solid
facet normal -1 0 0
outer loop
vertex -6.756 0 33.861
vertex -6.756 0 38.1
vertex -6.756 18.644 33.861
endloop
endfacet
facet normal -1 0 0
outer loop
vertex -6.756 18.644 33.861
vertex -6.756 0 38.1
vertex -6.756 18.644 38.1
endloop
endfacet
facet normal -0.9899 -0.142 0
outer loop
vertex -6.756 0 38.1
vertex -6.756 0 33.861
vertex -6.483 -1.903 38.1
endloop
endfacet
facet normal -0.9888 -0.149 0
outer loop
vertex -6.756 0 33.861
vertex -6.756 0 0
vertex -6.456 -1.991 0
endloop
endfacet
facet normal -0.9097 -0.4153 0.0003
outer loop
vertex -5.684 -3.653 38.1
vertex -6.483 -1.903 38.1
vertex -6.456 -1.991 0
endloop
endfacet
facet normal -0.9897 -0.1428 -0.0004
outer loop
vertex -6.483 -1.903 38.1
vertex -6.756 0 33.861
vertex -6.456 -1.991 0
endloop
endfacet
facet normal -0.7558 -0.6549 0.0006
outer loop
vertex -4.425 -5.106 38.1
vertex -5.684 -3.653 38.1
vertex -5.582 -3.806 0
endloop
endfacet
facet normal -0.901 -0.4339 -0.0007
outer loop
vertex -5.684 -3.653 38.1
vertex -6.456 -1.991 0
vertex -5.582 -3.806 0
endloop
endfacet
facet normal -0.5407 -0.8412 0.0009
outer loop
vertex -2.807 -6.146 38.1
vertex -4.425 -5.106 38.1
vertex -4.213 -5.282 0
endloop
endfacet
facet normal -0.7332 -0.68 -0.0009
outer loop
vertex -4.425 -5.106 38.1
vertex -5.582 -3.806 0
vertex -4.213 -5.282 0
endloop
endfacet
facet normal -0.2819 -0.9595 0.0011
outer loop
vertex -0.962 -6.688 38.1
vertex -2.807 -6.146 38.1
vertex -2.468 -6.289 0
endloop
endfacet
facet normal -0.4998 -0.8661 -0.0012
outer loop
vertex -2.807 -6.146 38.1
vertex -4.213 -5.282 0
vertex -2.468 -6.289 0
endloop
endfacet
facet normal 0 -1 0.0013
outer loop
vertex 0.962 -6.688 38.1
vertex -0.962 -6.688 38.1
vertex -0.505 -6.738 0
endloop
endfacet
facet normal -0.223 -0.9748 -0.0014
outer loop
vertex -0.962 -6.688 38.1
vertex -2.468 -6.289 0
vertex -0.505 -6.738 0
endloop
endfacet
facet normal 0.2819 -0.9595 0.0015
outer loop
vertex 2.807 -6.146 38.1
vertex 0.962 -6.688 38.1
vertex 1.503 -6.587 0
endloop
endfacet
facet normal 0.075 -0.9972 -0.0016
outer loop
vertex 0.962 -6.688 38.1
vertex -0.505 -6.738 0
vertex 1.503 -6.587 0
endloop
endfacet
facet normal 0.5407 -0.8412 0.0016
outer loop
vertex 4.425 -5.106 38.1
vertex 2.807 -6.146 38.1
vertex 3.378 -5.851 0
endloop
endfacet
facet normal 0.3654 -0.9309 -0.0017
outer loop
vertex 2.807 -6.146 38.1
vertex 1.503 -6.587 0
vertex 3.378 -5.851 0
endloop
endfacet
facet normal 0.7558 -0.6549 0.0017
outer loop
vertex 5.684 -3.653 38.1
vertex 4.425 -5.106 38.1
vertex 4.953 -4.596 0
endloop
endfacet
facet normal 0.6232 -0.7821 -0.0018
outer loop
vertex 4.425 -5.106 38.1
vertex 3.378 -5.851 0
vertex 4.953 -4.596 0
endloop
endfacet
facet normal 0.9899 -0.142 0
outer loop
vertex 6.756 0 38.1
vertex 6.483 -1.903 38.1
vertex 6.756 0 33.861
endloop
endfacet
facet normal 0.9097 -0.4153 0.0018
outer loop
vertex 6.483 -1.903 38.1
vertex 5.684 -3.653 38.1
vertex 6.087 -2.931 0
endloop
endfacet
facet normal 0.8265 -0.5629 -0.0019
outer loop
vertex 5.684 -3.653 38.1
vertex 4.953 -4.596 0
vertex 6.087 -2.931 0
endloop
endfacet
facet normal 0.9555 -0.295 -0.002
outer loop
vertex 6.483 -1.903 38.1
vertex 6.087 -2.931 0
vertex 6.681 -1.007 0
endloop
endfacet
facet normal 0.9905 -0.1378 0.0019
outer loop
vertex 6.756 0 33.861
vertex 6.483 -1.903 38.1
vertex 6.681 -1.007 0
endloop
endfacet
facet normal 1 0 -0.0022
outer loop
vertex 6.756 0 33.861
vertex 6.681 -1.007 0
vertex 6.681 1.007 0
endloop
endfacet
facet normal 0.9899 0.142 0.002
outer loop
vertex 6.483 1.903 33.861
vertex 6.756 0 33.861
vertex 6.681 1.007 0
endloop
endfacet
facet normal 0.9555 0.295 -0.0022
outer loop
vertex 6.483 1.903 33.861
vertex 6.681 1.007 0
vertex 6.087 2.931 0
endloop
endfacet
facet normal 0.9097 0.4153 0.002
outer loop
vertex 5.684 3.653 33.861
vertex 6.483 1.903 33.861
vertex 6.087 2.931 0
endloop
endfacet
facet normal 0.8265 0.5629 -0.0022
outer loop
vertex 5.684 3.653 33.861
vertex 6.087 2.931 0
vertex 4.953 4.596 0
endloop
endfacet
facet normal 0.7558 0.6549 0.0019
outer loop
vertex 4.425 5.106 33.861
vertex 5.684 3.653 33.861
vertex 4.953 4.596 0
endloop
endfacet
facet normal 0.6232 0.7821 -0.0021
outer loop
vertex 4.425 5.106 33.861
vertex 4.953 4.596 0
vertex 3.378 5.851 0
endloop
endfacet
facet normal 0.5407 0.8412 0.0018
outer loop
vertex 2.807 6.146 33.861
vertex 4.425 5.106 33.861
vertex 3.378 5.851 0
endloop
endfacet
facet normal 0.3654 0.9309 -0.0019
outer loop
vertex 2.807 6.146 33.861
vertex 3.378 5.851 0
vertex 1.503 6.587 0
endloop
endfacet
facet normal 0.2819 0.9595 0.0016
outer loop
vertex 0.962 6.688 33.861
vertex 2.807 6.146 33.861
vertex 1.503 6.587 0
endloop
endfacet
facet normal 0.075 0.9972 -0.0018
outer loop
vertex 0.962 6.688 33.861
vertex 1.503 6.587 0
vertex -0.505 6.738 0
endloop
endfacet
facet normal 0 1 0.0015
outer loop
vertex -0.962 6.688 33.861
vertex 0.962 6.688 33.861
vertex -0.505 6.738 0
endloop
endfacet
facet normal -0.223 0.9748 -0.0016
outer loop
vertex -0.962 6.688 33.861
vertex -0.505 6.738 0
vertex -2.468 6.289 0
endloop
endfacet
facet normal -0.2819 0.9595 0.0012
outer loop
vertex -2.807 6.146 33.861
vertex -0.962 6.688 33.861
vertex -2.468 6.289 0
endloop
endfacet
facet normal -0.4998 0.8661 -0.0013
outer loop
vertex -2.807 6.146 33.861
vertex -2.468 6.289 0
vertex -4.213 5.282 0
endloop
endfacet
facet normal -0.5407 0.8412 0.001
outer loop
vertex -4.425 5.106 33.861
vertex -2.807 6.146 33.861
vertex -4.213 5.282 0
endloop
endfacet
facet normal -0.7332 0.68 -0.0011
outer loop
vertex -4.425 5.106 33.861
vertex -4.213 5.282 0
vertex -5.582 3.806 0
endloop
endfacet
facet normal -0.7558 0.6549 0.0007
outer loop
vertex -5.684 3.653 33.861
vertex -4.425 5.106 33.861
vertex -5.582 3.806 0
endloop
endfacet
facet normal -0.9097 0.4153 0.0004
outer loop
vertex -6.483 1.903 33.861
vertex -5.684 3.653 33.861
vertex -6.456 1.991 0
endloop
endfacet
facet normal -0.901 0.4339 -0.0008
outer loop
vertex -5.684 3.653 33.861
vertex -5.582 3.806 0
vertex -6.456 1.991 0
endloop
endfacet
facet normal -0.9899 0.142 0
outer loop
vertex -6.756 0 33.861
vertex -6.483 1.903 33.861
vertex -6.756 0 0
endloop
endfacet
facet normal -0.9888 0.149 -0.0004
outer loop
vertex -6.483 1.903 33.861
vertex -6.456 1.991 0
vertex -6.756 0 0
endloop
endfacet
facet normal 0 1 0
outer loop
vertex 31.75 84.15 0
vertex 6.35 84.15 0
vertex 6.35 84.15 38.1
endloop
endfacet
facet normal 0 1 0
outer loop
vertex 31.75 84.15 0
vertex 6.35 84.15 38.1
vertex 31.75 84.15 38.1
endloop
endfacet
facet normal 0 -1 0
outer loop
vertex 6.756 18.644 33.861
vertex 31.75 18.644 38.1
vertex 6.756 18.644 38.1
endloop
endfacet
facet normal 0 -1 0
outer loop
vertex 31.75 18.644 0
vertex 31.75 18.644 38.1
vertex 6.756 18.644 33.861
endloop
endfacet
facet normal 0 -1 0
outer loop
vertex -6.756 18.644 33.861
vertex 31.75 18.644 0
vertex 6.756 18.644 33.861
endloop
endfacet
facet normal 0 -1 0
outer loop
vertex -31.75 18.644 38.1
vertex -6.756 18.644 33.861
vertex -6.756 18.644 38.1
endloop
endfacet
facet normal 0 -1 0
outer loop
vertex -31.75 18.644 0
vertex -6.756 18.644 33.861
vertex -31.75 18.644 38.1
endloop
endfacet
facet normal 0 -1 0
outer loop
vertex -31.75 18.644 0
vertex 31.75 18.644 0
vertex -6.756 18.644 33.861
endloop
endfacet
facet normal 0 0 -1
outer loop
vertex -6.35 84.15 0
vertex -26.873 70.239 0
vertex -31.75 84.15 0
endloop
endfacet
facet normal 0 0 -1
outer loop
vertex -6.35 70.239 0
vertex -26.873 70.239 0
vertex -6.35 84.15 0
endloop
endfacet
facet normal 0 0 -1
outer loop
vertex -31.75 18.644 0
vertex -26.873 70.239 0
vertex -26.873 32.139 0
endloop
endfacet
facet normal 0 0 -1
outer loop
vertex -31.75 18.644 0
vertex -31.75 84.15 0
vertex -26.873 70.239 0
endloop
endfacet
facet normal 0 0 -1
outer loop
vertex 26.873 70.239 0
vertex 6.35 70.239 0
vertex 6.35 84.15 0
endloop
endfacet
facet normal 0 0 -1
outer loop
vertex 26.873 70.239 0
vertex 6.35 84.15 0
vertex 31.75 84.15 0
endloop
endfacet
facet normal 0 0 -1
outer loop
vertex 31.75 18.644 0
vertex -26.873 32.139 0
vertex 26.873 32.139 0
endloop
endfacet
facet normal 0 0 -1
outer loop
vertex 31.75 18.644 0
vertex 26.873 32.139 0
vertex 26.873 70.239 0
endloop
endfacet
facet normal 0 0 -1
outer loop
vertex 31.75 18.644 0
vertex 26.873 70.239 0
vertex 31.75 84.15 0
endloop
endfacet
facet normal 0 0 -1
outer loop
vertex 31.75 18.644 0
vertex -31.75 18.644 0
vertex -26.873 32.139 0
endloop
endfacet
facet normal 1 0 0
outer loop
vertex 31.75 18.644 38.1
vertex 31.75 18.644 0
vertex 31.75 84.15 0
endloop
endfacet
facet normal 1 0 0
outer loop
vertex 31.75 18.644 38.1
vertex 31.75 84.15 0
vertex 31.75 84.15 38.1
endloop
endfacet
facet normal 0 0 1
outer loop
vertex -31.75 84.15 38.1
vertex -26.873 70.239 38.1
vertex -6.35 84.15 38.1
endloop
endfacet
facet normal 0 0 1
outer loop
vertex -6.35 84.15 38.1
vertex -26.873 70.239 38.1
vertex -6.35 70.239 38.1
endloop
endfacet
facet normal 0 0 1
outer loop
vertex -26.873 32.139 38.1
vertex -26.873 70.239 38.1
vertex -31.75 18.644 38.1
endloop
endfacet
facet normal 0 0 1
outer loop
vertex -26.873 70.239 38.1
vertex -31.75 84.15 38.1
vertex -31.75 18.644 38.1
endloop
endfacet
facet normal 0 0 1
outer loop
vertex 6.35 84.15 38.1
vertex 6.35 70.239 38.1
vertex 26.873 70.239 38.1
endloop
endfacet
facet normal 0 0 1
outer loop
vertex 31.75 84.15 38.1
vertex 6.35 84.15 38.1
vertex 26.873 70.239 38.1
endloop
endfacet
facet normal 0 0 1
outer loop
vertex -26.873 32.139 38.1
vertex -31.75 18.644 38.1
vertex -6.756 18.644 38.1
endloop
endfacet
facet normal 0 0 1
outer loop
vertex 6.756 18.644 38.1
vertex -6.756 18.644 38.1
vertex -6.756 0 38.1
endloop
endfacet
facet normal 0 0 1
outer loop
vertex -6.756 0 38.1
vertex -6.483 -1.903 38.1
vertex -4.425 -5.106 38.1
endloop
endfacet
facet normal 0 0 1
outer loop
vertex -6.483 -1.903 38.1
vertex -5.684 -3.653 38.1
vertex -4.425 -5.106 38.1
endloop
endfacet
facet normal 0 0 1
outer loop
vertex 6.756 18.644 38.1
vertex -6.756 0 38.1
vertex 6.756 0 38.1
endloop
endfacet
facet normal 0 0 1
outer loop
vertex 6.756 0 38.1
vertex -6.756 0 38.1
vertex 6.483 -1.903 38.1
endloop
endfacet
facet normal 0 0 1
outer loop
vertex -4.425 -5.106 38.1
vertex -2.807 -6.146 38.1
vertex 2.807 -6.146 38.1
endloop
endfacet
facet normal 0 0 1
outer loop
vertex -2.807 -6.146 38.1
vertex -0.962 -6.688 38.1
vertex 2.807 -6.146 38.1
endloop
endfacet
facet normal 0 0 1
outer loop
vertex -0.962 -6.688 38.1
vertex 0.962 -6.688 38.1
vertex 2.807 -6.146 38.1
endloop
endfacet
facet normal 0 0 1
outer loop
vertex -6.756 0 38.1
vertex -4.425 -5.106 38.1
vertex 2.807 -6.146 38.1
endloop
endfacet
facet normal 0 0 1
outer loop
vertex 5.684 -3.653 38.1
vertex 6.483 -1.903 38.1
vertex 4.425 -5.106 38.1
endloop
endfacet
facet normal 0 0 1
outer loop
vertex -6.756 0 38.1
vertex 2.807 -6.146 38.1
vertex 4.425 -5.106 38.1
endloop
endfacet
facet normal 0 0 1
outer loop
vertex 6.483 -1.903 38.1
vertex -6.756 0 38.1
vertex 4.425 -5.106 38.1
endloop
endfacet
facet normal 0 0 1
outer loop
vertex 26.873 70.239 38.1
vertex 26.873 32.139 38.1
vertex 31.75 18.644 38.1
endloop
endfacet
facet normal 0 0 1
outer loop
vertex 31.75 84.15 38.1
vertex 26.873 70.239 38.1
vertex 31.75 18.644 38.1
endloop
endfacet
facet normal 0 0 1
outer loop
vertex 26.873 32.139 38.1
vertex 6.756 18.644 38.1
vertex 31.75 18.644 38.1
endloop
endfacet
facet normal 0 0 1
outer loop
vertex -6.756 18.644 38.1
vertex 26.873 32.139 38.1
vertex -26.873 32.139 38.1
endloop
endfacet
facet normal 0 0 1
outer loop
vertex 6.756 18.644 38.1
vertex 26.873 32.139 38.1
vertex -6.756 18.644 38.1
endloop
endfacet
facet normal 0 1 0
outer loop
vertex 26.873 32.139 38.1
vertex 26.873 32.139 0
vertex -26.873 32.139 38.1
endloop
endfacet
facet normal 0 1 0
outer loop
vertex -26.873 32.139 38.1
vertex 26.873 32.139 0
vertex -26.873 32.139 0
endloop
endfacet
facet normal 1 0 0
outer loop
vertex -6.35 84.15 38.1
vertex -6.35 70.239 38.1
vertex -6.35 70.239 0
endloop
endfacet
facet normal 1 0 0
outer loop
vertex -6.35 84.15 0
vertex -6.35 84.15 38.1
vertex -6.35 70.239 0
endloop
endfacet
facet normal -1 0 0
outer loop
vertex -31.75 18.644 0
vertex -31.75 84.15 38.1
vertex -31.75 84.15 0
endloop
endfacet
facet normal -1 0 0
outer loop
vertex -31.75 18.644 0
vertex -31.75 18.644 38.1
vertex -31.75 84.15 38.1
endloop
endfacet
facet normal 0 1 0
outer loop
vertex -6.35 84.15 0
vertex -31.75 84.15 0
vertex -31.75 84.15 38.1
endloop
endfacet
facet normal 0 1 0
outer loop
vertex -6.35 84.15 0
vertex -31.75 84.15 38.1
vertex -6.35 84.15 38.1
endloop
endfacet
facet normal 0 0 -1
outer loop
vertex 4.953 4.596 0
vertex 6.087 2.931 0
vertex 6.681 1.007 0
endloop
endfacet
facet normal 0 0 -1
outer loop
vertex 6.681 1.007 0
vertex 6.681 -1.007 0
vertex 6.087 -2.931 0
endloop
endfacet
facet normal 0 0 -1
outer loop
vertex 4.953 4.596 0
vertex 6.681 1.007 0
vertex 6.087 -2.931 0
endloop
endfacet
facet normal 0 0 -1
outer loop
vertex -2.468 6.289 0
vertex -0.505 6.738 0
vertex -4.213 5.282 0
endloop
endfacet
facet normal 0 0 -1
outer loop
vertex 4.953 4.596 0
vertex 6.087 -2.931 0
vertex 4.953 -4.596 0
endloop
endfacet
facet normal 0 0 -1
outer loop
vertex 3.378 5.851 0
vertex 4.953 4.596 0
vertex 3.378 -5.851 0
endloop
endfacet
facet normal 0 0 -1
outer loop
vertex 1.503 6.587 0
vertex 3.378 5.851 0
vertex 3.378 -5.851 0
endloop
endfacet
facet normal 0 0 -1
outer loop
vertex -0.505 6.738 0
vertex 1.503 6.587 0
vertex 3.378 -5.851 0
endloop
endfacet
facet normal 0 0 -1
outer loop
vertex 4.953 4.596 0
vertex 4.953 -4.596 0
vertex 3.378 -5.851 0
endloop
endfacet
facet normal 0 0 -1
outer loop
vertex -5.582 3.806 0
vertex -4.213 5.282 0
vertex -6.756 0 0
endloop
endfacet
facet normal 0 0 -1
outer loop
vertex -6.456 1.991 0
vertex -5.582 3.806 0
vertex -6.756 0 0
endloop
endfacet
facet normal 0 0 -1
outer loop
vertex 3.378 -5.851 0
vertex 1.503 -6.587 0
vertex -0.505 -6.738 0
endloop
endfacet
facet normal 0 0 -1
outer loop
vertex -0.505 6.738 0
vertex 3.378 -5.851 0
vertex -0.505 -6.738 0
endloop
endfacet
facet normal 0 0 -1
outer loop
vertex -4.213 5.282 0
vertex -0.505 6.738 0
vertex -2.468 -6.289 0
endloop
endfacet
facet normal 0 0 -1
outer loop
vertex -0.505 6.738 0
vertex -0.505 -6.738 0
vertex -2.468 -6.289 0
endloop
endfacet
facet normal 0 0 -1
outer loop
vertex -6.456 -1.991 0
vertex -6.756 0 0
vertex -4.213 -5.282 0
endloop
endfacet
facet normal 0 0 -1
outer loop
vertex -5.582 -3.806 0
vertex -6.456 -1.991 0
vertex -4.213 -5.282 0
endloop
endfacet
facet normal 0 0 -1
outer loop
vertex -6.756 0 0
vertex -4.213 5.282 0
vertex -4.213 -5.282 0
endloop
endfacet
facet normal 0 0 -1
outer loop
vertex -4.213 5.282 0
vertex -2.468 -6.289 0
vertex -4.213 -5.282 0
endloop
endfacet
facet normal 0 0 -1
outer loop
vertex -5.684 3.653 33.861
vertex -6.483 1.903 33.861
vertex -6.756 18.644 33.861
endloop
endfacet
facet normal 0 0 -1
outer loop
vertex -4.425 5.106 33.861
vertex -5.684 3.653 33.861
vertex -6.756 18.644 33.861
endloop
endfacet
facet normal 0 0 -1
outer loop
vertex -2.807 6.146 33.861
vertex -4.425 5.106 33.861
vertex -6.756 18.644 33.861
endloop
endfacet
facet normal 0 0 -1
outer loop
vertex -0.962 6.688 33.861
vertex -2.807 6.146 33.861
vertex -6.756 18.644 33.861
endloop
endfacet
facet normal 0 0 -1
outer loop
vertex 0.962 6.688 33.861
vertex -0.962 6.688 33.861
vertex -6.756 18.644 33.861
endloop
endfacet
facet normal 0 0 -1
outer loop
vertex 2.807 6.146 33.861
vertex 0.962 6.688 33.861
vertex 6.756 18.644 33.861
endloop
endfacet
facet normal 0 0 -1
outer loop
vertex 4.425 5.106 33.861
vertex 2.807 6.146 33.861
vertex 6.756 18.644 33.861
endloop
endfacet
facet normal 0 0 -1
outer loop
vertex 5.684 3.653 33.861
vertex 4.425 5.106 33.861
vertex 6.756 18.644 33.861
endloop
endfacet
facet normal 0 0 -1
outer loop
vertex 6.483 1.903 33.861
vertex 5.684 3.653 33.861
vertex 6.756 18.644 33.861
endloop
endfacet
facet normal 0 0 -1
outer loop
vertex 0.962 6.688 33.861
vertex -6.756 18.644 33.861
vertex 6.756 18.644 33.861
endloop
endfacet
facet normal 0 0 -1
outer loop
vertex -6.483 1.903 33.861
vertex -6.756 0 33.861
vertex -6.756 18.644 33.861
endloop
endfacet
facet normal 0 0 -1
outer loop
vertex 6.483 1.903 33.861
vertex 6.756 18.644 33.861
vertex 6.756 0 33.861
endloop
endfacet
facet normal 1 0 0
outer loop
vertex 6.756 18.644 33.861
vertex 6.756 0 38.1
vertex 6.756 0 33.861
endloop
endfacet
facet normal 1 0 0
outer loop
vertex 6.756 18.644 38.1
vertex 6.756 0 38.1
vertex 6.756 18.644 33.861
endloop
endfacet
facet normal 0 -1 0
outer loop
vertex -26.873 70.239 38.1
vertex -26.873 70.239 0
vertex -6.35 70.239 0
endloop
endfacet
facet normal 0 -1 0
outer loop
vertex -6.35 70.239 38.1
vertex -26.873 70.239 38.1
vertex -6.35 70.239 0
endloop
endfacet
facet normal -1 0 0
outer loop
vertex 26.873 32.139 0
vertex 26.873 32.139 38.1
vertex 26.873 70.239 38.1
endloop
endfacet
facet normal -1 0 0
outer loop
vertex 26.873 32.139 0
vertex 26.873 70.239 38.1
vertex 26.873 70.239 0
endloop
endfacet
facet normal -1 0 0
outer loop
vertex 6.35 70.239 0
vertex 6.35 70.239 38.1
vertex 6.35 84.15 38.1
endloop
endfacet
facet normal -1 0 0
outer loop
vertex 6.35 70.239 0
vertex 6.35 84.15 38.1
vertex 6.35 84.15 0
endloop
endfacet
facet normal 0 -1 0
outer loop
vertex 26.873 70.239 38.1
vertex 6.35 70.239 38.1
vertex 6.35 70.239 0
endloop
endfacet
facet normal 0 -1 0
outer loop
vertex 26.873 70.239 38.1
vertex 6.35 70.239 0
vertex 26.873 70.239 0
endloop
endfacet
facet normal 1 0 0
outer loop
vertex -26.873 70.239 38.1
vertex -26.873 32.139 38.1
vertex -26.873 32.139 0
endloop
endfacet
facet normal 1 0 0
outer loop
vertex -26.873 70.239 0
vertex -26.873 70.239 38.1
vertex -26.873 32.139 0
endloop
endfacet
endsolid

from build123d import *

# Parameters (mm, degrees)
SKETCH1_R            = 6.7564
BOSS_EXTRUDE2_DEPTH  = 38.1
SKETCH2_W            = 13.5128
SKETCH2_H            = 18.6436
BOSS_EXTRUDE3_DEPTH  = 4.23926
BOSS_EXTRUDE6_DEPTH  = 13.49502
SKETCH7_W            = 4.8768
SKETCH7_H            = 38.1
BOSS_EXTRUDE10_DEPTH = 38.1
SKETCH8_W            = 25.4
SKETCH8_H            = 38.1
BOSS_EXTRUDE11_DEPTH = 13.91158


with BuildPart() as part:
    # Sketch1 → Boss-Extrude2 (new body)
    with BuildSketch(Plane.XY):
        with Locations(Location((0, 0, 0), (0, 0, 180))):
            Circle(SKETCH1_R)
    extrude(amount=BOSS_EXTRUDE2_DEPTH)

    # Sketch2 → Boss-Extrude3 (add)
    with BuildSketch(Plane.XY.offset(38.1)):
        with Locations((0, 9.3218)):
            Rectangle(SKETCH2_W, SKETCH2_H)
    extrude(amount=-BOSS_EXTRUDE3_DEPTH)

    # Sketch4 → Boss-Extrude6 (add)
    with BuildSketch(Plane(origin=(0, 18.6436, 0), x_dir=(1, 0, 0), z_dir=(0, 1, 0))):
        Polygon((0, -38.1), (-31.75, -38.1), (-31.75, 0), (31.75, 0), (31.75, -38.1), align=None)
    extrude(amount=BOSS_EXTRUDE6_DEPTH)

    # Sketch7 → Boss-Extrude10 (add)
    with BuildSketch(Plane(origin=(0, 32.13862, 0), x_dir=(1, 0, 0), z_dir=(0, 1, 0))):
        with Locations((-29.3116, -19.05)):
            Rectangle(SKETCH7_W, SKETCH7_H)
        with Locations((29.3116, -19.05)):
            Rectangle(SKETCH7_W, SKETCH7_H)
    extrude(amount=BOSS_EXTRUDE10_DEPTH)

    # Sketch8 → Boss-Extrude11 (add)
    with BuildSketch(Plane(origin=(0, 70.23862, 0), x_dir=(1, 0, 0), z_dir=(0, 1, 0))):
        with Locations((-19.05, -19.05)):
            Rectangle(SKETCH8_W, SKETCH8_H)
        with Locations((19.05, -19.05)):
            Rectangle(SKETCH8_W, SKETCH8_H)
    extrude(amount=BOSS_EXTRUDE11_DEPTH)


solid = part.part
